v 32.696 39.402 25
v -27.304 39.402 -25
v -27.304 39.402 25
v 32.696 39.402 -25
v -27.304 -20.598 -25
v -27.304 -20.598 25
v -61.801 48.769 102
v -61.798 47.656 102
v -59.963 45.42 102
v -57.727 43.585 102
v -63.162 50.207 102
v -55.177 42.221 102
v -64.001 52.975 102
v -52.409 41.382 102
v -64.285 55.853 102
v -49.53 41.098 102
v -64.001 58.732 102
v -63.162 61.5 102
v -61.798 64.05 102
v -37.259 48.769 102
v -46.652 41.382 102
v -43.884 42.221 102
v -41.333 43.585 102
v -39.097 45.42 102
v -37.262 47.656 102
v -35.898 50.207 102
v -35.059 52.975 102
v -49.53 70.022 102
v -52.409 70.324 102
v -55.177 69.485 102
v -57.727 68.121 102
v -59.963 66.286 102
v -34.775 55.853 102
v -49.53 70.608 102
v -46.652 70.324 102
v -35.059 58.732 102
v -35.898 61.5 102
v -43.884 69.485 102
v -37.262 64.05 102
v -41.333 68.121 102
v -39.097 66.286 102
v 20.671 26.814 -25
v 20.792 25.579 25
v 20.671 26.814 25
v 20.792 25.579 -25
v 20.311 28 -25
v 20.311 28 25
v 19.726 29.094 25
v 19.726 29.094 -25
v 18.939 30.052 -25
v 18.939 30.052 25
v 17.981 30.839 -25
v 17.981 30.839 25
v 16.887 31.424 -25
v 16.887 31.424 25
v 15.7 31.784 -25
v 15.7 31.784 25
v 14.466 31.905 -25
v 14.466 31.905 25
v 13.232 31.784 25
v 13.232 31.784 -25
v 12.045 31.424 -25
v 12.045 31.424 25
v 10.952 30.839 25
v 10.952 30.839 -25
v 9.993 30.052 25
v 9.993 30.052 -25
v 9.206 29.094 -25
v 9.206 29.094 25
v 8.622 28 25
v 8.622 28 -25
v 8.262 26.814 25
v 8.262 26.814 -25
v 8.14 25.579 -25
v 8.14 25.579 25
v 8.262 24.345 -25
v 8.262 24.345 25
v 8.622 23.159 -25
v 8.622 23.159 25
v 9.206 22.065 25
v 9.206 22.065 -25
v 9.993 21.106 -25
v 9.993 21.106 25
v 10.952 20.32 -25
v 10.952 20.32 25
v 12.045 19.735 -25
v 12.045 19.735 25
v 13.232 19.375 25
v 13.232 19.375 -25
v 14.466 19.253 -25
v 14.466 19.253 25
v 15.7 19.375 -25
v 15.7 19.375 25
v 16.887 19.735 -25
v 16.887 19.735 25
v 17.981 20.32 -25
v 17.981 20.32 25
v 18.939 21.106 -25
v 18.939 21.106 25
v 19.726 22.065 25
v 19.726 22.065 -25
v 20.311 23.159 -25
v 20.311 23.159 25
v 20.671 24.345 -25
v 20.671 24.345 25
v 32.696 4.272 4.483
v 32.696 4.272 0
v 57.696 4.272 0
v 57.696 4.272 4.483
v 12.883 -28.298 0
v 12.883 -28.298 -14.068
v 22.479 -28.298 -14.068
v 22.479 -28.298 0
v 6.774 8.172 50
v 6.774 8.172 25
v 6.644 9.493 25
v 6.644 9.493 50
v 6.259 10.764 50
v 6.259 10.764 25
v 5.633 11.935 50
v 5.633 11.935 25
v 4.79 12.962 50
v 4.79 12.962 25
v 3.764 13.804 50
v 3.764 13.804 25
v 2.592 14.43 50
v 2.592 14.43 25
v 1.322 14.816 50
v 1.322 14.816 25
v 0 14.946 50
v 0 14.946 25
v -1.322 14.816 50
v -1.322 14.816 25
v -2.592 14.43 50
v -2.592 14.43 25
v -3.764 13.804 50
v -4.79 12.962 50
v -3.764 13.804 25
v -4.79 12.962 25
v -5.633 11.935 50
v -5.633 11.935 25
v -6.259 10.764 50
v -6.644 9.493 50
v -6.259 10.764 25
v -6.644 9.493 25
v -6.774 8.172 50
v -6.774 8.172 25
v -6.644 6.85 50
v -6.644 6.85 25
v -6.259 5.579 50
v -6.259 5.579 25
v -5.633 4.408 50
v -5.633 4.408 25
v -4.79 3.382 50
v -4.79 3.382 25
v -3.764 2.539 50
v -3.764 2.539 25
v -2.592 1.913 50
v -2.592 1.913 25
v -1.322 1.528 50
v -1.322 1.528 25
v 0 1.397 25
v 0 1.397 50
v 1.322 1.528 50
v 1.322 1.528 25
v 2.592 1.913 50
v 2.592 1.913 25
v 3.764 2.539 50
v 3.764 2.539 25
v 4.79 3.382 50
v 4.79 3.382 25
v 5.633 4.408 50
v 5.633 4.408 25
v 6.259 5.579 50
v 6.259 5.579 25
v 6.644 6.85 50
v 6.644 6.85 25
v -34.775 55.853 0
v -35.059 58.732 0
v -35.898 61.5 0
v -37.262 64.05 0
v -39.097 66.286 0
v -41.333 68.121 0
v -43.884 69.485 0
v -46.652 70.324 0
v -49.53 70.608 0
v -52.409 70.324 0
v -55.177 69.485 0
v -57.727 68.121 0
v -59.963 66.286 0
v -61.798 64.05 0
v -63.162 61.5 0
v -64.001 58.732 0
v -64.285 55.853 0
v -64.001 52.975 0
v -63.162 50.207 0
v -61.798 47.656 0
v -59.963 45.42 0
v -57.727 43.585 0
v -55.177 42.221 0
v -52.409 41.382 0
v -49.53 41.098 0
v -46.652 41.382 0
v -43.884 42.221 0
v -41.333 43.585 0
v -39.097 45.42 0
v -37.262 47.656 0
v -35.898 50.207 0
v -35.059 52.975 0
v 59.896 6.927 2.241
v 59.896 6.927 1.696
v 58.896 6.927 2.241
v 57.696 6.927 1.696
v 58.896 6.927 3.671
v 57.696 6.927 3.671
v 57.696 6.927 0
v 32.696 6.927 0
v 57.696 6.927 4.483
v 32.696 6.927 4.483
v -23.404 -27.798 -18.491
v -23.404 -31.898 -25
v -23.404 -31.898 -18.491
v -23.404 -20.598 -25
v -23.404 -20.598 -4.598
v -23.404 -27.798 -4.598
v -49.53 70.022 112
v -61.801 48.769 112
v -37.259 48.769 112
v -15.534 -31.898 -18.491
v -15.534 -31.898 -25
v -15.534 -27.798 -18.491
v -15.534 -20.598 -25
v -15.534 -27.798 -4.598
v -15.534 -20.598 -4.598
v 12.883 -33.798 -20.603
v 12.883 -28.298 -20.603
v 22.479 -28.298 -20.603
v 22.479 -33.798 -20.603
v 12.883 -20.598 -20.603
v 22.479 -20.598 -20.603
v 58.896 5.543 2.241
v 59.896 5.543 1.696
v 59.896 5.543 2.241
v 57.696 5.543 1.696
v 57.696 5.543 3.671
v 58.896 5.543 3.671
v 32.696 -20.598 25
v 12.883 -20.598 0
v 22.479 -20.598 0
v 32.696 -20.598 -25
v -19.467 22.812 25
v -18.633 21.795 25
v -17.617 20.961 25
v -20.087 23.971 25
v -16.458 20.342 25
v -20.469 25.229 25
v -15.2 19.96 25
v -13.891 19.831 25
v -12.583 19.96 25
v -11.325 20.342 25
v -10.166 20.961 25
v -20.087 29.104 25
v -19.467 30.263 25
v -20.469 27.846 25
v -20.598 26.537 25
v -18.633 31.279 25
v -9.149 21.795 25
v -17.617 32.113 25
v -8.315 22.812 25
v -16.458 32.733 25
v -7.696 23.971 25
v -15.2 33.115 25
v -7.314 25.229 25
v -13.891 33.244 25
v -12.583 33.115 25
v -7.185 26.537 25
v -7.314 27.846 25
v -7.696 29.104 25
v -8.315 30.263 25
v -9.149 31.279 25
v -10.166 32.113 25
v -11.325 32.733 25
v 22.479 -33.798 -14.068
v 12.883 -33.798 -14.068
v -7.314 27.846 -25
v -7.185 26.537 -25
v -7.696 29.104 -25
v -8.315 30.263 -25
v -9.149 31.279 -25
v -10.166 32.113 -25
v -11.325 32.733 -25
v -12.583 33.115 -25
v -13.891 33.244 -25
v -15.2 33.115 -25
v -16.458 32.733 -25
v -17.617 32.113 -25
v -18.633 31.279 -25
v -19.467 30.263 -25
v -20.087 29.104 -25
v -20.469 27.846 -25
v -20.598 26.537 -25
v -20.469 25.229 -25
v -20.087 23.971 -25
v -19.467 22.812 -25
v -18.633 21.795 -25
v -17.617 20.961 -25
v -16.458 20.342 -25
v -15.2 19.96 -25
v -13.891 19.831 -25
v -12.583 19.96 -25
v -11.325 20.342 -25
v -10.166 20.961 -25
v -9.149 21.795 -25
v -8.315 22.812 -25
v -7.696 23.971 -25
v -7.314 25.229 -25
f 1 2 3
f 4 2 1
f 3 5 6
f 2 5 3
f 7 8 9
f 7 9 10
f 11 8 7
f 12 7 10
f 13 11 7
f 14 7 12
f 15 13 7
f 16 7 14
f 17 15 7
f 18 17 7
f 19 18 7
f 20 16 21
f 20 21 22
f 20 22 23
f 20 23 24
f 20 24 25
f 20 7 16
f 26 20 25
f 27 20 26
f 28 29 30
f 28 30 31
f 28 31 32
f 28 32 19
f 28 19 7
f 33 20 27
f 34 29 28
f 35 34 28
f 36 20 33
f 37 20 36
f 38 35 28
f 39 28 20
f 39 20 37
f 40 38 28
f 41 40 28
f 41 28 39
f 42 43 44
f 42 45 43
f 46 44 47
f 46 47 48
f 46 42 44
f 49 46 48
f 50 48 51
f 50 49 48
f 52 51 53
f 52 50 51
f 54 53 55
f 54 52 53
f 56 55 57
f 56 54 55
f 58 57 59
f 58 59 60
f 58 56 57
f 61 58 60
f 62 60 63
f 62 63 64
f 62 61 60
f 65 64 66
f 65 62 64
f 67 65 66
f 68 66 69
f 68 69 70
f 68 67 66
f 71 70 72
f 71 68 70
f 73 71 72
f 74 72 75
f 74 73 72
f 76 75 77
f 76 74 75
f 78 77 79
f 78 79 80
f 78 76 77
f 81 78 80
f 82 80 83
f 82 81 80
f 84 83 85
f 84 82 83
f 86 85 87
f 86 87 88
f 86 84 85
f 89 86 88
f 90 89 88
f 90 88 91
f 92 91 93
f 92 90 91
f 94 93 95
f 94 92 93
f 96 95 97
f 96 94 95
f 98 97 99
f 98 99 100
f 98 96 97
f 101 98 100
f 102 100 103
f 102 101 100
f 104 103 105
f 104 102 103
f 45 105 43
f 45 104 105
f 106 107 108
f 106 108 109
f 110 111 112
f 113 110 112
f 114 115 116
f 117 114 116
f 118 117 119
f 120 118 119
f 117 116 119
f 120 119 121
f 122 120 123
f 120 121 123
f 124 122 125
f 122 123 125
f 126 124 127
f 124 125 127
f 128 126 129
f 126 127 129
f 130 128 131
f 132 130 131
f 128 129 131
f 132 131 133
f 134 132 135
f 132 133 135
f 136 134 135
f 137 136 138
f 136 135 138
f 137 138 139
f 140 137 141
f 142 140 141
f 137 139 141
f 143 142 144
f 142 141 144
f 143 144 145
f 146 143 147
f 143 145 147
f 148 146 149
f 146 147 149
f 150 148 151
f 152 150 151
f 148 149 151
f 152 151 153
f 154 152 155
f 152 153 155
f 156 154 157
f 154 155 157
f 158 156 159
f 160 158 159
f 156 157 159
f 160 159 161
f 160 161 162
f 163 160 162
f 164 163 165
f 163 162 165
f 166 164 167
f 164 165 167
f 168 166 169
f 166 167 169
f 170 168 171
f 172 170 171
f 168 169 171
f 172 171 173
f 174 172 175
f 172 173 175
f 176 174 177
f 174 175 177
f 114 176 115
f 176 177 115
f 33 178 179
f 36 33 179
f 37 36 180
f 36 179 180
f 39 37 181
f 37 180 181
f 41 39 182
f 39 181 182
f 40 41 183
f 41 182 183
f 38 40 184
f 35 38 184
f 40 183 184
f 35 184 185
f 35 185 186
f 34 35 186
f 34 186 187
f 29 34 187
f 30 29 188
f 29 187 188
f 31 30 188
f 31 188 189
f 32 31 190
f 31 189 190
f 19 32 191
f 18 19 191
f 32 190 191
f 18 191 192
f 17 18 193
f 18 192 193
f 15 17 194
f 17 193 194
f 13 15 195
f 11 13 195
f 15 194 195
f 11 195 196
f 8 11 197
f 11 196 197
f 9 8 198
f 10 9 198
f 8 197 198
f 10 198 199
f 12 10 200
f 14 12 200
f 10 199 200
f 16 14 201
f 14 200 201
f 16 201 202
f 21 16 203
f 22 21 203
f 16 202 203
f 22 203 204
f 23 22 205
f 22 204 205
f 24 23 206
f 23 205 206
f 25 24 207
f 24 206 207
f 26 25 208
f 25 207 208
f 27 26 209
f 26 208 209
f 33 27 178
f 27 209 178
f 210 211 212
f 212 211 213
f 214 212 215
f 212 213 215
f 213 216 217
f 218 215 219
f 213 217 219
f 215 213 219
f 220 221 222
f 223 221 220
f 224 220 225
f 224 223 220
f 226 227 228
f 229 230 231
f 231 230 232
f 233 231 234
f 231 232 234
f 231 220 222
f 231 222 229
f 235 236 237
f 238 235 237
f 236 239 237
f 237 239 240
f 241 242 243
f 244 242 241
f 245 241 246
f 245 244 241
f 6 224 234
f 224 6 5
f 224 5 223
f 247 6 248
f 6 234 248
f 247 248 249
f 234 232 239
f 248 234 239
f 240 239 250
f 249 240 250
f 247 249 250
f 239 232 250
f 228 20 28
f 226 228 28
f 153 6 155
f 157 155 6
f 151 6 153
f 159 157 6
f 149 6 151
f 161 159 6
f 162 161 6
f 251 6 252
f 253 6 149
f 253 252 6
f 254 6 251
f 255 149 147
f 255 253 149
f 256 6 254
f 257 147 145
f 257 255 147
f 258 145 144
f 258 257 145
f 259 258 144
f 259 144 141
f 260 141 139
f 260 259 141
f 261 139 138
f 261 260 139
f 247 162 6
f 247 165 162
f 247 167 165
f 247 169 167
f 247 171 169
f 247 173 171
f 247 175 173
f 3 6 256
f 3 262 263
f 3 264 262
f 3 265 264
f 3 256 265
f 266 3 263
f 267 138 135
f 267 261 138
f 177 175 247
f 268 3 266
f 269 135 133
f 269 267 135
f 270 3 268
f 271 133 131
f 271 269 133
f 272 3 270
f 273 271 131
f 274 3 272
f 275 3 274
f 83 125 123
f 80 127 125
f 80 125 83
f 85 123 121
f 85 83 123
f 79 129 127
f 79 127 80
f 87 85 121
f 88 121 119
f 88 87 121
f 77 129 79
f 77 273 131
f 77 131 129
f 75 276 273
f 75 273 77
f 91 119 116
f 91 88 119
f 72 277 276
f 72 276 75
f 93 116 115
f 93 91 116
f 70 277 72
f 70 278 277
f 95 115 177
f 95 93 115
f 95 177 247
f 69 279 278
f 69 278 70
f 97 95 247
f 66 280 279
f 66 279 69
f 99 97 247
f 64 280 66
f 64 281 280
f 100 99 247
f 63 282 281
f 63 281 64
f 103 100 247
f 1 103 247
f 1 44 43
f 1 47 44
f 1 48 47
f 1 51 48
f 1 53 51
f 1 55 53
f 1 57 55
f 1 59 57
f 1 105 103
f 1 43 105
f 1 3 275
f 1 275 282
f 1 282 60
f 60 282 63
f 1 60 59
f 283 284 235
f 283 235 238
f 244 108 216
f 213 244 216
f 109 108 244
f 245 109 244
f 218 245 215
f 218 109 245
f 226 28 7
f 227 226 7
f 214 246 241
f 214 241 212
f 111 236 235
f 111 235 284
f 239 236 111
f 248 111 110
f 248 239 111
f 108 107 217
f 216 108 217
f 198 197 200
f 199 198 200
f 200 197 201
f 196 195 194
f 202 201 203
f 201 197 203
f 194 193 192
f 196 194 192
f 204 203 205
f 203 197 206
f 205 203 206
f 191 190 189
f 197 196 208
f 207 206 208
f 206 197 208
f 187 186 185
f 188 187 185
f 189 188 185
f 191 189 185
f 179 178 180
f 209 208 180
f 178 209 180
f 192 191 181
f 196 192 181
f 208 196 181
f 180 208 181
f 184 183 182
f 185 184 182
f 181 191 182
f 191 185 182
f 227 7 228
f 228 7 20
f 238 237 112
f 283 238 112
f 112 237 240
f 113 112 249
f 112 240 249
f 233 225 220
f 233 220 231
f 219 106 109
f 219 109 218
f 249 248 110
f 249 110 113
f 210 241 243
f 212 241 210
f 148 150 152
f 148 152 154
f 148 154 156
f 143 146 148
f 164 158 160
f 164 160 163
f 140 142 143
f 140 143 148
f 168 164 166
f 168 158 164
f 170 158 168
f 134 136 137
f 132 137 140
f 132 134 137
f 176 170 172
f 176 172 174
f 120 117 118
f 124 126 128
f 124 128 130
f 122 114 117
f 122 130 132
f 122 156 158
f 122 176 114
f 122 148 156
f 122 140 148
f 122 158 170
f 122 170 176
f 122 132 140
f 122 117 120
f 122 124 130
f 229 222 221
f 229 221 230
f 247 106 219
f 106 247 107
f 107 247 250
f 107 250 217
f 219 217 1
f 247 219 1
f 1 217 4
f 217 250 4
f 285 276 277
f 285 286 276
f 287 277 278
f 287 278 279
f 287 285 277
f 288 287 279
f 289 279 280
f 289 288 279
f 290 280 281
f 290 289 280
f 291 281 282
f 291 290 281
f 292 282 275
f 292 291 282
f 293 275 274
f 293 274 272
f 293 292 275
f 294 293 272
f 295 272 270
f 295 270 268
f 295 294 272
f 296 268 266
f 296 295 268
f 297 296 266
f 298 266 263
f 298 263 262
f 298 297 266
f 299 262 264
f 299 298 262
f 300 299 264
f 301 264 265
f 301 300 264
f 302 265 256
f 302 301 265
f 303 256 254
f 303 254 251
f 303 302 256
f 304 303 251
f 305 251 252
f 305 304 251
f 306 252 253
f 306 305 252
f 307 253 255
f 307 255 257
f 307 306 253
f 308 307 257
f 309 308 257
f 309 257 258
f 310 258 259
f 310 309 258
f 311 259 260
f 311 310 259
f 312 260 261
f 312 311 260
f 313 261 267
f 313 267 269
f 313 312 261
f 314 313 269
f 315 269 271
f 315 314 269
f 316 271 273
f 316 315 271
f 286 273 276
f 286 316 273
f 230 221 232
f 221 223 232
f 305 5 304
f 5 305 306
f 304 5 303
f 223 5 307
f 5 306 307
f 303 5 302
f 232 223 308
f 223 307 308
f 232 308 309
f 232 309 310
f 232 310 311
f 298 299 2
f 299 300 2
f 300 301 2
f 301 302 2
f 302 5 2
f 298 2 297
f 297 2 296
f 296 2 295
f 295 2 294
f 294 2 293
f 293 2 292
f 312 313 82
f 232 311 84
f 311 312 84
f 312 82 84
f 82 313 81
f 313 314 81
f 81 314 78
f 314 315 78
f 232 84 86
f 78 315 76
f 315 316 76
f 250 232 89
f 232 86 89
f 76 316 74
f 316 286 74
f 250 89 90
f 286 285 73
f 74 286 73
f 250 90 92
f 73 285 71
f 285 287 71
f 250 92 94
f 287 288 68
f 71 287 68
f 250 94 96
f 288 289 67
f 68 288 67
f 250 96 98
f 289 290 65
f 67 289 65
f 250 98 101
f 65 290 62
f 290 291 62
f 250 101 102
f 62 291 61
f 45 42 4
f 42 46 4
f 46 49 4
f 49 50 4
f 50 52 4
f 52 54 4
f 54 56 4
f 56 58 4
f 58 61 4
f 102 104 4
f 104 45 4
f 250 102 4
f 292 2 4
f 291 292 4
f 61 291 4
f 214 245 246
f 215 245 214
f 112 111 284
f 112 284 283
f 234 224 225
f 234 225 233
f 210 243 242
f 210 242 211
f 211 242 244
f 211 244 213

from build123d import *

# Parameters (mm, degrees)
F0_W      = 60
F0_H      = 60
F0_R      = 6.7062031478
F0_R_2    = 6.3258965971
F1_DEPTH  = 25
F2_DEPTH  = 1.1
F3_DEPTH  = 25
F4_DEPTH  = 25
F5_R      = 6.7742007843
F6_DEPTH  = 25
F7_W      = 9.5957089216
F7_H      = 20.6033345312
F8_DEPTH  = 7.7
F9_W      = 9.5957089216
F9_H      = 6.5357079729
F10_DEPTH = 5.5
F11_W     = 7.8699858859
F11_H     = 20.4023887403
F12_DEPTH = 7.2
F13_W     = 7.8699858859
F13_H     = 6.5085865557
F14_DEPTH = 4.1
F15_W     = 2.6549622416
F15_H     = 4.4827312231
F16_DEPTH = 25
F17_W     = 1.3844114728
F17_H     = 0.5452939076
F18_DEPTH = 2.2
F19_W     = 1.3844114728
F19_H     = 1.4300532639
F20_DEPTH = 1.2
F21_R     = 14.7548987497
F22_DEPTH = 102
F24_DEPTH = 10


with BuildPart() as f1:
    # F0 (on Top) → F1 (new body)
    with BuildSketch(Plane.XY):
        with Locations((2.6961664855, 9.4023707509)):
            Rectangle(F0_W, F0_H)
        with Locations((-13.8914240524, 26.5374090523)):
            Circle(F0_R, mode=Mode.SUBTRACT)
        with Locations((14.4662400708, 25.5793798715)):
            Circle(F0_R_2, mode=Mode.SUBTRACT)
    extrude(amount=-F1_DEPTH)

    # F2 (add): a face of the model
    f2_faces = [f1.faces().sort_by_distance(p)[0] for p in [
        (2.9553682193, 8.0658285207, -25),
    ]]
    extrude(f2_faces, amount=-F2_DEPTH)

    # F3 (add): a face of the model
    f3_faces = [f1.faces().sort_by_distance(p)[0] for p in [
        (2.6961664855, -20.5976292491, -12.5),
    ]]
    extrude(f3_faces, amount=-F3_DEPTH)

    # F0 (on Top) → F4 (join)
    with BuildSketch(Plane.XY):
        with Locations((2.6961664855, 9.4023707509)):
            Rectangle(F0_W, F0_H)
        with Locations((-13.8914240524, 26.5374090523)):
            Circle(F0_R, mode=Mode.SUBTRACT)
        with Locations((14.4662400708, 25.5793798715)):
            Circle(F0_R_2, mode=Mode.SUBTRACT)
    extrude(amount=F4_DEPTH)

    # F5 (on face) → F6 (join)
    with BuildSketch(Plane.XY.offset(25)):
        with Locations((0, 8.1716347486)):
            Circle(F5_R)
    extrude(amount=F6_DEPTH)

    # F7 (on face) → F8 (join)
    with BuildSketch(Plane.XZ.offset(20.5976292491)):
        with Locations((17.6809793338, -10.3016672656)):
            Rectangle(F7_W, F7_H)
    extrude(amount=F8_DEPTH)

    # F9 (on face) → F10 (join)
    with BuildSketch(Plane.XZ.offset(28.2976292491)):
        with Locations((17.6809793338, -17.3354805447)):
            Rectangle(F9_W, F9_H)
    extrude(amount=F10_DEPTH)

    # F11 (on face) → F12 (join)
    with BuildSketch(Plane.XZ.offset(20.5976292491)):
        with Locations((-19.4689254276, -14.7988056298)):
            Rectangle(F11_W, F11_H)
    extrude(amount=F12_DEPTH)

    # F13 (on face) → F14 (join)
    with BuildSketch(Plane.XZ.offset(27.7976292491)):
        with Locations((-19.4689254276, -21.7457067221)):
            Rectangle(F13_W, F13_H)
    extrude(amount=F14_DEPTH)

    # F15 (on face) → F16 (join)
    with BuildSketch(Plane.YZ.offset(32.6961664855)):
        with Locations((5.5994908325, 2.2413656116)):
            Rectangle(F15_W, F15_H)
    extrude(amount=F16_DEPTH)

    # F17 (on face) → F18 (join)
    with BuildSketch(Plane.YZ.offset(57.6961664855)):
        with Locations((6.2347662169, 1.9687186577)):
            Rectangle(F17_W, F17_H)
    extrude(amount=F18_DEPTH)

    # F19 (on face) → F20 (join)
    with BuildSketch(Plane.YZ.offset(57.6961664855)):
        with Locations((6.2347662169, 2.9563922435)):
            Rectangle(F19_W, F19_H)
    extrude(amount=F20_DEPTH)


with BuildPart() as f22:
    # F21 (on Top) → F22 (new body)
    with BuildSketch(Plane.XY):
        with Locations((-49.5301112533, 55.8531060815)):
            Circle(F21_R)
    extrude(amount=F22_DEPTH)

    # F23 (on face) → F24 (join)
    with BuildSketch(Plane.XY.offset(102)):
        Polygon((-61.8010059437, 48.7685017288), (-37.2592165628, 48.7685017288), (-49.5301112533, 70.0223147869), align=None)
    extrude(amount=F24_DEPTH)


solid = Compound([f1.part, f22.part])
